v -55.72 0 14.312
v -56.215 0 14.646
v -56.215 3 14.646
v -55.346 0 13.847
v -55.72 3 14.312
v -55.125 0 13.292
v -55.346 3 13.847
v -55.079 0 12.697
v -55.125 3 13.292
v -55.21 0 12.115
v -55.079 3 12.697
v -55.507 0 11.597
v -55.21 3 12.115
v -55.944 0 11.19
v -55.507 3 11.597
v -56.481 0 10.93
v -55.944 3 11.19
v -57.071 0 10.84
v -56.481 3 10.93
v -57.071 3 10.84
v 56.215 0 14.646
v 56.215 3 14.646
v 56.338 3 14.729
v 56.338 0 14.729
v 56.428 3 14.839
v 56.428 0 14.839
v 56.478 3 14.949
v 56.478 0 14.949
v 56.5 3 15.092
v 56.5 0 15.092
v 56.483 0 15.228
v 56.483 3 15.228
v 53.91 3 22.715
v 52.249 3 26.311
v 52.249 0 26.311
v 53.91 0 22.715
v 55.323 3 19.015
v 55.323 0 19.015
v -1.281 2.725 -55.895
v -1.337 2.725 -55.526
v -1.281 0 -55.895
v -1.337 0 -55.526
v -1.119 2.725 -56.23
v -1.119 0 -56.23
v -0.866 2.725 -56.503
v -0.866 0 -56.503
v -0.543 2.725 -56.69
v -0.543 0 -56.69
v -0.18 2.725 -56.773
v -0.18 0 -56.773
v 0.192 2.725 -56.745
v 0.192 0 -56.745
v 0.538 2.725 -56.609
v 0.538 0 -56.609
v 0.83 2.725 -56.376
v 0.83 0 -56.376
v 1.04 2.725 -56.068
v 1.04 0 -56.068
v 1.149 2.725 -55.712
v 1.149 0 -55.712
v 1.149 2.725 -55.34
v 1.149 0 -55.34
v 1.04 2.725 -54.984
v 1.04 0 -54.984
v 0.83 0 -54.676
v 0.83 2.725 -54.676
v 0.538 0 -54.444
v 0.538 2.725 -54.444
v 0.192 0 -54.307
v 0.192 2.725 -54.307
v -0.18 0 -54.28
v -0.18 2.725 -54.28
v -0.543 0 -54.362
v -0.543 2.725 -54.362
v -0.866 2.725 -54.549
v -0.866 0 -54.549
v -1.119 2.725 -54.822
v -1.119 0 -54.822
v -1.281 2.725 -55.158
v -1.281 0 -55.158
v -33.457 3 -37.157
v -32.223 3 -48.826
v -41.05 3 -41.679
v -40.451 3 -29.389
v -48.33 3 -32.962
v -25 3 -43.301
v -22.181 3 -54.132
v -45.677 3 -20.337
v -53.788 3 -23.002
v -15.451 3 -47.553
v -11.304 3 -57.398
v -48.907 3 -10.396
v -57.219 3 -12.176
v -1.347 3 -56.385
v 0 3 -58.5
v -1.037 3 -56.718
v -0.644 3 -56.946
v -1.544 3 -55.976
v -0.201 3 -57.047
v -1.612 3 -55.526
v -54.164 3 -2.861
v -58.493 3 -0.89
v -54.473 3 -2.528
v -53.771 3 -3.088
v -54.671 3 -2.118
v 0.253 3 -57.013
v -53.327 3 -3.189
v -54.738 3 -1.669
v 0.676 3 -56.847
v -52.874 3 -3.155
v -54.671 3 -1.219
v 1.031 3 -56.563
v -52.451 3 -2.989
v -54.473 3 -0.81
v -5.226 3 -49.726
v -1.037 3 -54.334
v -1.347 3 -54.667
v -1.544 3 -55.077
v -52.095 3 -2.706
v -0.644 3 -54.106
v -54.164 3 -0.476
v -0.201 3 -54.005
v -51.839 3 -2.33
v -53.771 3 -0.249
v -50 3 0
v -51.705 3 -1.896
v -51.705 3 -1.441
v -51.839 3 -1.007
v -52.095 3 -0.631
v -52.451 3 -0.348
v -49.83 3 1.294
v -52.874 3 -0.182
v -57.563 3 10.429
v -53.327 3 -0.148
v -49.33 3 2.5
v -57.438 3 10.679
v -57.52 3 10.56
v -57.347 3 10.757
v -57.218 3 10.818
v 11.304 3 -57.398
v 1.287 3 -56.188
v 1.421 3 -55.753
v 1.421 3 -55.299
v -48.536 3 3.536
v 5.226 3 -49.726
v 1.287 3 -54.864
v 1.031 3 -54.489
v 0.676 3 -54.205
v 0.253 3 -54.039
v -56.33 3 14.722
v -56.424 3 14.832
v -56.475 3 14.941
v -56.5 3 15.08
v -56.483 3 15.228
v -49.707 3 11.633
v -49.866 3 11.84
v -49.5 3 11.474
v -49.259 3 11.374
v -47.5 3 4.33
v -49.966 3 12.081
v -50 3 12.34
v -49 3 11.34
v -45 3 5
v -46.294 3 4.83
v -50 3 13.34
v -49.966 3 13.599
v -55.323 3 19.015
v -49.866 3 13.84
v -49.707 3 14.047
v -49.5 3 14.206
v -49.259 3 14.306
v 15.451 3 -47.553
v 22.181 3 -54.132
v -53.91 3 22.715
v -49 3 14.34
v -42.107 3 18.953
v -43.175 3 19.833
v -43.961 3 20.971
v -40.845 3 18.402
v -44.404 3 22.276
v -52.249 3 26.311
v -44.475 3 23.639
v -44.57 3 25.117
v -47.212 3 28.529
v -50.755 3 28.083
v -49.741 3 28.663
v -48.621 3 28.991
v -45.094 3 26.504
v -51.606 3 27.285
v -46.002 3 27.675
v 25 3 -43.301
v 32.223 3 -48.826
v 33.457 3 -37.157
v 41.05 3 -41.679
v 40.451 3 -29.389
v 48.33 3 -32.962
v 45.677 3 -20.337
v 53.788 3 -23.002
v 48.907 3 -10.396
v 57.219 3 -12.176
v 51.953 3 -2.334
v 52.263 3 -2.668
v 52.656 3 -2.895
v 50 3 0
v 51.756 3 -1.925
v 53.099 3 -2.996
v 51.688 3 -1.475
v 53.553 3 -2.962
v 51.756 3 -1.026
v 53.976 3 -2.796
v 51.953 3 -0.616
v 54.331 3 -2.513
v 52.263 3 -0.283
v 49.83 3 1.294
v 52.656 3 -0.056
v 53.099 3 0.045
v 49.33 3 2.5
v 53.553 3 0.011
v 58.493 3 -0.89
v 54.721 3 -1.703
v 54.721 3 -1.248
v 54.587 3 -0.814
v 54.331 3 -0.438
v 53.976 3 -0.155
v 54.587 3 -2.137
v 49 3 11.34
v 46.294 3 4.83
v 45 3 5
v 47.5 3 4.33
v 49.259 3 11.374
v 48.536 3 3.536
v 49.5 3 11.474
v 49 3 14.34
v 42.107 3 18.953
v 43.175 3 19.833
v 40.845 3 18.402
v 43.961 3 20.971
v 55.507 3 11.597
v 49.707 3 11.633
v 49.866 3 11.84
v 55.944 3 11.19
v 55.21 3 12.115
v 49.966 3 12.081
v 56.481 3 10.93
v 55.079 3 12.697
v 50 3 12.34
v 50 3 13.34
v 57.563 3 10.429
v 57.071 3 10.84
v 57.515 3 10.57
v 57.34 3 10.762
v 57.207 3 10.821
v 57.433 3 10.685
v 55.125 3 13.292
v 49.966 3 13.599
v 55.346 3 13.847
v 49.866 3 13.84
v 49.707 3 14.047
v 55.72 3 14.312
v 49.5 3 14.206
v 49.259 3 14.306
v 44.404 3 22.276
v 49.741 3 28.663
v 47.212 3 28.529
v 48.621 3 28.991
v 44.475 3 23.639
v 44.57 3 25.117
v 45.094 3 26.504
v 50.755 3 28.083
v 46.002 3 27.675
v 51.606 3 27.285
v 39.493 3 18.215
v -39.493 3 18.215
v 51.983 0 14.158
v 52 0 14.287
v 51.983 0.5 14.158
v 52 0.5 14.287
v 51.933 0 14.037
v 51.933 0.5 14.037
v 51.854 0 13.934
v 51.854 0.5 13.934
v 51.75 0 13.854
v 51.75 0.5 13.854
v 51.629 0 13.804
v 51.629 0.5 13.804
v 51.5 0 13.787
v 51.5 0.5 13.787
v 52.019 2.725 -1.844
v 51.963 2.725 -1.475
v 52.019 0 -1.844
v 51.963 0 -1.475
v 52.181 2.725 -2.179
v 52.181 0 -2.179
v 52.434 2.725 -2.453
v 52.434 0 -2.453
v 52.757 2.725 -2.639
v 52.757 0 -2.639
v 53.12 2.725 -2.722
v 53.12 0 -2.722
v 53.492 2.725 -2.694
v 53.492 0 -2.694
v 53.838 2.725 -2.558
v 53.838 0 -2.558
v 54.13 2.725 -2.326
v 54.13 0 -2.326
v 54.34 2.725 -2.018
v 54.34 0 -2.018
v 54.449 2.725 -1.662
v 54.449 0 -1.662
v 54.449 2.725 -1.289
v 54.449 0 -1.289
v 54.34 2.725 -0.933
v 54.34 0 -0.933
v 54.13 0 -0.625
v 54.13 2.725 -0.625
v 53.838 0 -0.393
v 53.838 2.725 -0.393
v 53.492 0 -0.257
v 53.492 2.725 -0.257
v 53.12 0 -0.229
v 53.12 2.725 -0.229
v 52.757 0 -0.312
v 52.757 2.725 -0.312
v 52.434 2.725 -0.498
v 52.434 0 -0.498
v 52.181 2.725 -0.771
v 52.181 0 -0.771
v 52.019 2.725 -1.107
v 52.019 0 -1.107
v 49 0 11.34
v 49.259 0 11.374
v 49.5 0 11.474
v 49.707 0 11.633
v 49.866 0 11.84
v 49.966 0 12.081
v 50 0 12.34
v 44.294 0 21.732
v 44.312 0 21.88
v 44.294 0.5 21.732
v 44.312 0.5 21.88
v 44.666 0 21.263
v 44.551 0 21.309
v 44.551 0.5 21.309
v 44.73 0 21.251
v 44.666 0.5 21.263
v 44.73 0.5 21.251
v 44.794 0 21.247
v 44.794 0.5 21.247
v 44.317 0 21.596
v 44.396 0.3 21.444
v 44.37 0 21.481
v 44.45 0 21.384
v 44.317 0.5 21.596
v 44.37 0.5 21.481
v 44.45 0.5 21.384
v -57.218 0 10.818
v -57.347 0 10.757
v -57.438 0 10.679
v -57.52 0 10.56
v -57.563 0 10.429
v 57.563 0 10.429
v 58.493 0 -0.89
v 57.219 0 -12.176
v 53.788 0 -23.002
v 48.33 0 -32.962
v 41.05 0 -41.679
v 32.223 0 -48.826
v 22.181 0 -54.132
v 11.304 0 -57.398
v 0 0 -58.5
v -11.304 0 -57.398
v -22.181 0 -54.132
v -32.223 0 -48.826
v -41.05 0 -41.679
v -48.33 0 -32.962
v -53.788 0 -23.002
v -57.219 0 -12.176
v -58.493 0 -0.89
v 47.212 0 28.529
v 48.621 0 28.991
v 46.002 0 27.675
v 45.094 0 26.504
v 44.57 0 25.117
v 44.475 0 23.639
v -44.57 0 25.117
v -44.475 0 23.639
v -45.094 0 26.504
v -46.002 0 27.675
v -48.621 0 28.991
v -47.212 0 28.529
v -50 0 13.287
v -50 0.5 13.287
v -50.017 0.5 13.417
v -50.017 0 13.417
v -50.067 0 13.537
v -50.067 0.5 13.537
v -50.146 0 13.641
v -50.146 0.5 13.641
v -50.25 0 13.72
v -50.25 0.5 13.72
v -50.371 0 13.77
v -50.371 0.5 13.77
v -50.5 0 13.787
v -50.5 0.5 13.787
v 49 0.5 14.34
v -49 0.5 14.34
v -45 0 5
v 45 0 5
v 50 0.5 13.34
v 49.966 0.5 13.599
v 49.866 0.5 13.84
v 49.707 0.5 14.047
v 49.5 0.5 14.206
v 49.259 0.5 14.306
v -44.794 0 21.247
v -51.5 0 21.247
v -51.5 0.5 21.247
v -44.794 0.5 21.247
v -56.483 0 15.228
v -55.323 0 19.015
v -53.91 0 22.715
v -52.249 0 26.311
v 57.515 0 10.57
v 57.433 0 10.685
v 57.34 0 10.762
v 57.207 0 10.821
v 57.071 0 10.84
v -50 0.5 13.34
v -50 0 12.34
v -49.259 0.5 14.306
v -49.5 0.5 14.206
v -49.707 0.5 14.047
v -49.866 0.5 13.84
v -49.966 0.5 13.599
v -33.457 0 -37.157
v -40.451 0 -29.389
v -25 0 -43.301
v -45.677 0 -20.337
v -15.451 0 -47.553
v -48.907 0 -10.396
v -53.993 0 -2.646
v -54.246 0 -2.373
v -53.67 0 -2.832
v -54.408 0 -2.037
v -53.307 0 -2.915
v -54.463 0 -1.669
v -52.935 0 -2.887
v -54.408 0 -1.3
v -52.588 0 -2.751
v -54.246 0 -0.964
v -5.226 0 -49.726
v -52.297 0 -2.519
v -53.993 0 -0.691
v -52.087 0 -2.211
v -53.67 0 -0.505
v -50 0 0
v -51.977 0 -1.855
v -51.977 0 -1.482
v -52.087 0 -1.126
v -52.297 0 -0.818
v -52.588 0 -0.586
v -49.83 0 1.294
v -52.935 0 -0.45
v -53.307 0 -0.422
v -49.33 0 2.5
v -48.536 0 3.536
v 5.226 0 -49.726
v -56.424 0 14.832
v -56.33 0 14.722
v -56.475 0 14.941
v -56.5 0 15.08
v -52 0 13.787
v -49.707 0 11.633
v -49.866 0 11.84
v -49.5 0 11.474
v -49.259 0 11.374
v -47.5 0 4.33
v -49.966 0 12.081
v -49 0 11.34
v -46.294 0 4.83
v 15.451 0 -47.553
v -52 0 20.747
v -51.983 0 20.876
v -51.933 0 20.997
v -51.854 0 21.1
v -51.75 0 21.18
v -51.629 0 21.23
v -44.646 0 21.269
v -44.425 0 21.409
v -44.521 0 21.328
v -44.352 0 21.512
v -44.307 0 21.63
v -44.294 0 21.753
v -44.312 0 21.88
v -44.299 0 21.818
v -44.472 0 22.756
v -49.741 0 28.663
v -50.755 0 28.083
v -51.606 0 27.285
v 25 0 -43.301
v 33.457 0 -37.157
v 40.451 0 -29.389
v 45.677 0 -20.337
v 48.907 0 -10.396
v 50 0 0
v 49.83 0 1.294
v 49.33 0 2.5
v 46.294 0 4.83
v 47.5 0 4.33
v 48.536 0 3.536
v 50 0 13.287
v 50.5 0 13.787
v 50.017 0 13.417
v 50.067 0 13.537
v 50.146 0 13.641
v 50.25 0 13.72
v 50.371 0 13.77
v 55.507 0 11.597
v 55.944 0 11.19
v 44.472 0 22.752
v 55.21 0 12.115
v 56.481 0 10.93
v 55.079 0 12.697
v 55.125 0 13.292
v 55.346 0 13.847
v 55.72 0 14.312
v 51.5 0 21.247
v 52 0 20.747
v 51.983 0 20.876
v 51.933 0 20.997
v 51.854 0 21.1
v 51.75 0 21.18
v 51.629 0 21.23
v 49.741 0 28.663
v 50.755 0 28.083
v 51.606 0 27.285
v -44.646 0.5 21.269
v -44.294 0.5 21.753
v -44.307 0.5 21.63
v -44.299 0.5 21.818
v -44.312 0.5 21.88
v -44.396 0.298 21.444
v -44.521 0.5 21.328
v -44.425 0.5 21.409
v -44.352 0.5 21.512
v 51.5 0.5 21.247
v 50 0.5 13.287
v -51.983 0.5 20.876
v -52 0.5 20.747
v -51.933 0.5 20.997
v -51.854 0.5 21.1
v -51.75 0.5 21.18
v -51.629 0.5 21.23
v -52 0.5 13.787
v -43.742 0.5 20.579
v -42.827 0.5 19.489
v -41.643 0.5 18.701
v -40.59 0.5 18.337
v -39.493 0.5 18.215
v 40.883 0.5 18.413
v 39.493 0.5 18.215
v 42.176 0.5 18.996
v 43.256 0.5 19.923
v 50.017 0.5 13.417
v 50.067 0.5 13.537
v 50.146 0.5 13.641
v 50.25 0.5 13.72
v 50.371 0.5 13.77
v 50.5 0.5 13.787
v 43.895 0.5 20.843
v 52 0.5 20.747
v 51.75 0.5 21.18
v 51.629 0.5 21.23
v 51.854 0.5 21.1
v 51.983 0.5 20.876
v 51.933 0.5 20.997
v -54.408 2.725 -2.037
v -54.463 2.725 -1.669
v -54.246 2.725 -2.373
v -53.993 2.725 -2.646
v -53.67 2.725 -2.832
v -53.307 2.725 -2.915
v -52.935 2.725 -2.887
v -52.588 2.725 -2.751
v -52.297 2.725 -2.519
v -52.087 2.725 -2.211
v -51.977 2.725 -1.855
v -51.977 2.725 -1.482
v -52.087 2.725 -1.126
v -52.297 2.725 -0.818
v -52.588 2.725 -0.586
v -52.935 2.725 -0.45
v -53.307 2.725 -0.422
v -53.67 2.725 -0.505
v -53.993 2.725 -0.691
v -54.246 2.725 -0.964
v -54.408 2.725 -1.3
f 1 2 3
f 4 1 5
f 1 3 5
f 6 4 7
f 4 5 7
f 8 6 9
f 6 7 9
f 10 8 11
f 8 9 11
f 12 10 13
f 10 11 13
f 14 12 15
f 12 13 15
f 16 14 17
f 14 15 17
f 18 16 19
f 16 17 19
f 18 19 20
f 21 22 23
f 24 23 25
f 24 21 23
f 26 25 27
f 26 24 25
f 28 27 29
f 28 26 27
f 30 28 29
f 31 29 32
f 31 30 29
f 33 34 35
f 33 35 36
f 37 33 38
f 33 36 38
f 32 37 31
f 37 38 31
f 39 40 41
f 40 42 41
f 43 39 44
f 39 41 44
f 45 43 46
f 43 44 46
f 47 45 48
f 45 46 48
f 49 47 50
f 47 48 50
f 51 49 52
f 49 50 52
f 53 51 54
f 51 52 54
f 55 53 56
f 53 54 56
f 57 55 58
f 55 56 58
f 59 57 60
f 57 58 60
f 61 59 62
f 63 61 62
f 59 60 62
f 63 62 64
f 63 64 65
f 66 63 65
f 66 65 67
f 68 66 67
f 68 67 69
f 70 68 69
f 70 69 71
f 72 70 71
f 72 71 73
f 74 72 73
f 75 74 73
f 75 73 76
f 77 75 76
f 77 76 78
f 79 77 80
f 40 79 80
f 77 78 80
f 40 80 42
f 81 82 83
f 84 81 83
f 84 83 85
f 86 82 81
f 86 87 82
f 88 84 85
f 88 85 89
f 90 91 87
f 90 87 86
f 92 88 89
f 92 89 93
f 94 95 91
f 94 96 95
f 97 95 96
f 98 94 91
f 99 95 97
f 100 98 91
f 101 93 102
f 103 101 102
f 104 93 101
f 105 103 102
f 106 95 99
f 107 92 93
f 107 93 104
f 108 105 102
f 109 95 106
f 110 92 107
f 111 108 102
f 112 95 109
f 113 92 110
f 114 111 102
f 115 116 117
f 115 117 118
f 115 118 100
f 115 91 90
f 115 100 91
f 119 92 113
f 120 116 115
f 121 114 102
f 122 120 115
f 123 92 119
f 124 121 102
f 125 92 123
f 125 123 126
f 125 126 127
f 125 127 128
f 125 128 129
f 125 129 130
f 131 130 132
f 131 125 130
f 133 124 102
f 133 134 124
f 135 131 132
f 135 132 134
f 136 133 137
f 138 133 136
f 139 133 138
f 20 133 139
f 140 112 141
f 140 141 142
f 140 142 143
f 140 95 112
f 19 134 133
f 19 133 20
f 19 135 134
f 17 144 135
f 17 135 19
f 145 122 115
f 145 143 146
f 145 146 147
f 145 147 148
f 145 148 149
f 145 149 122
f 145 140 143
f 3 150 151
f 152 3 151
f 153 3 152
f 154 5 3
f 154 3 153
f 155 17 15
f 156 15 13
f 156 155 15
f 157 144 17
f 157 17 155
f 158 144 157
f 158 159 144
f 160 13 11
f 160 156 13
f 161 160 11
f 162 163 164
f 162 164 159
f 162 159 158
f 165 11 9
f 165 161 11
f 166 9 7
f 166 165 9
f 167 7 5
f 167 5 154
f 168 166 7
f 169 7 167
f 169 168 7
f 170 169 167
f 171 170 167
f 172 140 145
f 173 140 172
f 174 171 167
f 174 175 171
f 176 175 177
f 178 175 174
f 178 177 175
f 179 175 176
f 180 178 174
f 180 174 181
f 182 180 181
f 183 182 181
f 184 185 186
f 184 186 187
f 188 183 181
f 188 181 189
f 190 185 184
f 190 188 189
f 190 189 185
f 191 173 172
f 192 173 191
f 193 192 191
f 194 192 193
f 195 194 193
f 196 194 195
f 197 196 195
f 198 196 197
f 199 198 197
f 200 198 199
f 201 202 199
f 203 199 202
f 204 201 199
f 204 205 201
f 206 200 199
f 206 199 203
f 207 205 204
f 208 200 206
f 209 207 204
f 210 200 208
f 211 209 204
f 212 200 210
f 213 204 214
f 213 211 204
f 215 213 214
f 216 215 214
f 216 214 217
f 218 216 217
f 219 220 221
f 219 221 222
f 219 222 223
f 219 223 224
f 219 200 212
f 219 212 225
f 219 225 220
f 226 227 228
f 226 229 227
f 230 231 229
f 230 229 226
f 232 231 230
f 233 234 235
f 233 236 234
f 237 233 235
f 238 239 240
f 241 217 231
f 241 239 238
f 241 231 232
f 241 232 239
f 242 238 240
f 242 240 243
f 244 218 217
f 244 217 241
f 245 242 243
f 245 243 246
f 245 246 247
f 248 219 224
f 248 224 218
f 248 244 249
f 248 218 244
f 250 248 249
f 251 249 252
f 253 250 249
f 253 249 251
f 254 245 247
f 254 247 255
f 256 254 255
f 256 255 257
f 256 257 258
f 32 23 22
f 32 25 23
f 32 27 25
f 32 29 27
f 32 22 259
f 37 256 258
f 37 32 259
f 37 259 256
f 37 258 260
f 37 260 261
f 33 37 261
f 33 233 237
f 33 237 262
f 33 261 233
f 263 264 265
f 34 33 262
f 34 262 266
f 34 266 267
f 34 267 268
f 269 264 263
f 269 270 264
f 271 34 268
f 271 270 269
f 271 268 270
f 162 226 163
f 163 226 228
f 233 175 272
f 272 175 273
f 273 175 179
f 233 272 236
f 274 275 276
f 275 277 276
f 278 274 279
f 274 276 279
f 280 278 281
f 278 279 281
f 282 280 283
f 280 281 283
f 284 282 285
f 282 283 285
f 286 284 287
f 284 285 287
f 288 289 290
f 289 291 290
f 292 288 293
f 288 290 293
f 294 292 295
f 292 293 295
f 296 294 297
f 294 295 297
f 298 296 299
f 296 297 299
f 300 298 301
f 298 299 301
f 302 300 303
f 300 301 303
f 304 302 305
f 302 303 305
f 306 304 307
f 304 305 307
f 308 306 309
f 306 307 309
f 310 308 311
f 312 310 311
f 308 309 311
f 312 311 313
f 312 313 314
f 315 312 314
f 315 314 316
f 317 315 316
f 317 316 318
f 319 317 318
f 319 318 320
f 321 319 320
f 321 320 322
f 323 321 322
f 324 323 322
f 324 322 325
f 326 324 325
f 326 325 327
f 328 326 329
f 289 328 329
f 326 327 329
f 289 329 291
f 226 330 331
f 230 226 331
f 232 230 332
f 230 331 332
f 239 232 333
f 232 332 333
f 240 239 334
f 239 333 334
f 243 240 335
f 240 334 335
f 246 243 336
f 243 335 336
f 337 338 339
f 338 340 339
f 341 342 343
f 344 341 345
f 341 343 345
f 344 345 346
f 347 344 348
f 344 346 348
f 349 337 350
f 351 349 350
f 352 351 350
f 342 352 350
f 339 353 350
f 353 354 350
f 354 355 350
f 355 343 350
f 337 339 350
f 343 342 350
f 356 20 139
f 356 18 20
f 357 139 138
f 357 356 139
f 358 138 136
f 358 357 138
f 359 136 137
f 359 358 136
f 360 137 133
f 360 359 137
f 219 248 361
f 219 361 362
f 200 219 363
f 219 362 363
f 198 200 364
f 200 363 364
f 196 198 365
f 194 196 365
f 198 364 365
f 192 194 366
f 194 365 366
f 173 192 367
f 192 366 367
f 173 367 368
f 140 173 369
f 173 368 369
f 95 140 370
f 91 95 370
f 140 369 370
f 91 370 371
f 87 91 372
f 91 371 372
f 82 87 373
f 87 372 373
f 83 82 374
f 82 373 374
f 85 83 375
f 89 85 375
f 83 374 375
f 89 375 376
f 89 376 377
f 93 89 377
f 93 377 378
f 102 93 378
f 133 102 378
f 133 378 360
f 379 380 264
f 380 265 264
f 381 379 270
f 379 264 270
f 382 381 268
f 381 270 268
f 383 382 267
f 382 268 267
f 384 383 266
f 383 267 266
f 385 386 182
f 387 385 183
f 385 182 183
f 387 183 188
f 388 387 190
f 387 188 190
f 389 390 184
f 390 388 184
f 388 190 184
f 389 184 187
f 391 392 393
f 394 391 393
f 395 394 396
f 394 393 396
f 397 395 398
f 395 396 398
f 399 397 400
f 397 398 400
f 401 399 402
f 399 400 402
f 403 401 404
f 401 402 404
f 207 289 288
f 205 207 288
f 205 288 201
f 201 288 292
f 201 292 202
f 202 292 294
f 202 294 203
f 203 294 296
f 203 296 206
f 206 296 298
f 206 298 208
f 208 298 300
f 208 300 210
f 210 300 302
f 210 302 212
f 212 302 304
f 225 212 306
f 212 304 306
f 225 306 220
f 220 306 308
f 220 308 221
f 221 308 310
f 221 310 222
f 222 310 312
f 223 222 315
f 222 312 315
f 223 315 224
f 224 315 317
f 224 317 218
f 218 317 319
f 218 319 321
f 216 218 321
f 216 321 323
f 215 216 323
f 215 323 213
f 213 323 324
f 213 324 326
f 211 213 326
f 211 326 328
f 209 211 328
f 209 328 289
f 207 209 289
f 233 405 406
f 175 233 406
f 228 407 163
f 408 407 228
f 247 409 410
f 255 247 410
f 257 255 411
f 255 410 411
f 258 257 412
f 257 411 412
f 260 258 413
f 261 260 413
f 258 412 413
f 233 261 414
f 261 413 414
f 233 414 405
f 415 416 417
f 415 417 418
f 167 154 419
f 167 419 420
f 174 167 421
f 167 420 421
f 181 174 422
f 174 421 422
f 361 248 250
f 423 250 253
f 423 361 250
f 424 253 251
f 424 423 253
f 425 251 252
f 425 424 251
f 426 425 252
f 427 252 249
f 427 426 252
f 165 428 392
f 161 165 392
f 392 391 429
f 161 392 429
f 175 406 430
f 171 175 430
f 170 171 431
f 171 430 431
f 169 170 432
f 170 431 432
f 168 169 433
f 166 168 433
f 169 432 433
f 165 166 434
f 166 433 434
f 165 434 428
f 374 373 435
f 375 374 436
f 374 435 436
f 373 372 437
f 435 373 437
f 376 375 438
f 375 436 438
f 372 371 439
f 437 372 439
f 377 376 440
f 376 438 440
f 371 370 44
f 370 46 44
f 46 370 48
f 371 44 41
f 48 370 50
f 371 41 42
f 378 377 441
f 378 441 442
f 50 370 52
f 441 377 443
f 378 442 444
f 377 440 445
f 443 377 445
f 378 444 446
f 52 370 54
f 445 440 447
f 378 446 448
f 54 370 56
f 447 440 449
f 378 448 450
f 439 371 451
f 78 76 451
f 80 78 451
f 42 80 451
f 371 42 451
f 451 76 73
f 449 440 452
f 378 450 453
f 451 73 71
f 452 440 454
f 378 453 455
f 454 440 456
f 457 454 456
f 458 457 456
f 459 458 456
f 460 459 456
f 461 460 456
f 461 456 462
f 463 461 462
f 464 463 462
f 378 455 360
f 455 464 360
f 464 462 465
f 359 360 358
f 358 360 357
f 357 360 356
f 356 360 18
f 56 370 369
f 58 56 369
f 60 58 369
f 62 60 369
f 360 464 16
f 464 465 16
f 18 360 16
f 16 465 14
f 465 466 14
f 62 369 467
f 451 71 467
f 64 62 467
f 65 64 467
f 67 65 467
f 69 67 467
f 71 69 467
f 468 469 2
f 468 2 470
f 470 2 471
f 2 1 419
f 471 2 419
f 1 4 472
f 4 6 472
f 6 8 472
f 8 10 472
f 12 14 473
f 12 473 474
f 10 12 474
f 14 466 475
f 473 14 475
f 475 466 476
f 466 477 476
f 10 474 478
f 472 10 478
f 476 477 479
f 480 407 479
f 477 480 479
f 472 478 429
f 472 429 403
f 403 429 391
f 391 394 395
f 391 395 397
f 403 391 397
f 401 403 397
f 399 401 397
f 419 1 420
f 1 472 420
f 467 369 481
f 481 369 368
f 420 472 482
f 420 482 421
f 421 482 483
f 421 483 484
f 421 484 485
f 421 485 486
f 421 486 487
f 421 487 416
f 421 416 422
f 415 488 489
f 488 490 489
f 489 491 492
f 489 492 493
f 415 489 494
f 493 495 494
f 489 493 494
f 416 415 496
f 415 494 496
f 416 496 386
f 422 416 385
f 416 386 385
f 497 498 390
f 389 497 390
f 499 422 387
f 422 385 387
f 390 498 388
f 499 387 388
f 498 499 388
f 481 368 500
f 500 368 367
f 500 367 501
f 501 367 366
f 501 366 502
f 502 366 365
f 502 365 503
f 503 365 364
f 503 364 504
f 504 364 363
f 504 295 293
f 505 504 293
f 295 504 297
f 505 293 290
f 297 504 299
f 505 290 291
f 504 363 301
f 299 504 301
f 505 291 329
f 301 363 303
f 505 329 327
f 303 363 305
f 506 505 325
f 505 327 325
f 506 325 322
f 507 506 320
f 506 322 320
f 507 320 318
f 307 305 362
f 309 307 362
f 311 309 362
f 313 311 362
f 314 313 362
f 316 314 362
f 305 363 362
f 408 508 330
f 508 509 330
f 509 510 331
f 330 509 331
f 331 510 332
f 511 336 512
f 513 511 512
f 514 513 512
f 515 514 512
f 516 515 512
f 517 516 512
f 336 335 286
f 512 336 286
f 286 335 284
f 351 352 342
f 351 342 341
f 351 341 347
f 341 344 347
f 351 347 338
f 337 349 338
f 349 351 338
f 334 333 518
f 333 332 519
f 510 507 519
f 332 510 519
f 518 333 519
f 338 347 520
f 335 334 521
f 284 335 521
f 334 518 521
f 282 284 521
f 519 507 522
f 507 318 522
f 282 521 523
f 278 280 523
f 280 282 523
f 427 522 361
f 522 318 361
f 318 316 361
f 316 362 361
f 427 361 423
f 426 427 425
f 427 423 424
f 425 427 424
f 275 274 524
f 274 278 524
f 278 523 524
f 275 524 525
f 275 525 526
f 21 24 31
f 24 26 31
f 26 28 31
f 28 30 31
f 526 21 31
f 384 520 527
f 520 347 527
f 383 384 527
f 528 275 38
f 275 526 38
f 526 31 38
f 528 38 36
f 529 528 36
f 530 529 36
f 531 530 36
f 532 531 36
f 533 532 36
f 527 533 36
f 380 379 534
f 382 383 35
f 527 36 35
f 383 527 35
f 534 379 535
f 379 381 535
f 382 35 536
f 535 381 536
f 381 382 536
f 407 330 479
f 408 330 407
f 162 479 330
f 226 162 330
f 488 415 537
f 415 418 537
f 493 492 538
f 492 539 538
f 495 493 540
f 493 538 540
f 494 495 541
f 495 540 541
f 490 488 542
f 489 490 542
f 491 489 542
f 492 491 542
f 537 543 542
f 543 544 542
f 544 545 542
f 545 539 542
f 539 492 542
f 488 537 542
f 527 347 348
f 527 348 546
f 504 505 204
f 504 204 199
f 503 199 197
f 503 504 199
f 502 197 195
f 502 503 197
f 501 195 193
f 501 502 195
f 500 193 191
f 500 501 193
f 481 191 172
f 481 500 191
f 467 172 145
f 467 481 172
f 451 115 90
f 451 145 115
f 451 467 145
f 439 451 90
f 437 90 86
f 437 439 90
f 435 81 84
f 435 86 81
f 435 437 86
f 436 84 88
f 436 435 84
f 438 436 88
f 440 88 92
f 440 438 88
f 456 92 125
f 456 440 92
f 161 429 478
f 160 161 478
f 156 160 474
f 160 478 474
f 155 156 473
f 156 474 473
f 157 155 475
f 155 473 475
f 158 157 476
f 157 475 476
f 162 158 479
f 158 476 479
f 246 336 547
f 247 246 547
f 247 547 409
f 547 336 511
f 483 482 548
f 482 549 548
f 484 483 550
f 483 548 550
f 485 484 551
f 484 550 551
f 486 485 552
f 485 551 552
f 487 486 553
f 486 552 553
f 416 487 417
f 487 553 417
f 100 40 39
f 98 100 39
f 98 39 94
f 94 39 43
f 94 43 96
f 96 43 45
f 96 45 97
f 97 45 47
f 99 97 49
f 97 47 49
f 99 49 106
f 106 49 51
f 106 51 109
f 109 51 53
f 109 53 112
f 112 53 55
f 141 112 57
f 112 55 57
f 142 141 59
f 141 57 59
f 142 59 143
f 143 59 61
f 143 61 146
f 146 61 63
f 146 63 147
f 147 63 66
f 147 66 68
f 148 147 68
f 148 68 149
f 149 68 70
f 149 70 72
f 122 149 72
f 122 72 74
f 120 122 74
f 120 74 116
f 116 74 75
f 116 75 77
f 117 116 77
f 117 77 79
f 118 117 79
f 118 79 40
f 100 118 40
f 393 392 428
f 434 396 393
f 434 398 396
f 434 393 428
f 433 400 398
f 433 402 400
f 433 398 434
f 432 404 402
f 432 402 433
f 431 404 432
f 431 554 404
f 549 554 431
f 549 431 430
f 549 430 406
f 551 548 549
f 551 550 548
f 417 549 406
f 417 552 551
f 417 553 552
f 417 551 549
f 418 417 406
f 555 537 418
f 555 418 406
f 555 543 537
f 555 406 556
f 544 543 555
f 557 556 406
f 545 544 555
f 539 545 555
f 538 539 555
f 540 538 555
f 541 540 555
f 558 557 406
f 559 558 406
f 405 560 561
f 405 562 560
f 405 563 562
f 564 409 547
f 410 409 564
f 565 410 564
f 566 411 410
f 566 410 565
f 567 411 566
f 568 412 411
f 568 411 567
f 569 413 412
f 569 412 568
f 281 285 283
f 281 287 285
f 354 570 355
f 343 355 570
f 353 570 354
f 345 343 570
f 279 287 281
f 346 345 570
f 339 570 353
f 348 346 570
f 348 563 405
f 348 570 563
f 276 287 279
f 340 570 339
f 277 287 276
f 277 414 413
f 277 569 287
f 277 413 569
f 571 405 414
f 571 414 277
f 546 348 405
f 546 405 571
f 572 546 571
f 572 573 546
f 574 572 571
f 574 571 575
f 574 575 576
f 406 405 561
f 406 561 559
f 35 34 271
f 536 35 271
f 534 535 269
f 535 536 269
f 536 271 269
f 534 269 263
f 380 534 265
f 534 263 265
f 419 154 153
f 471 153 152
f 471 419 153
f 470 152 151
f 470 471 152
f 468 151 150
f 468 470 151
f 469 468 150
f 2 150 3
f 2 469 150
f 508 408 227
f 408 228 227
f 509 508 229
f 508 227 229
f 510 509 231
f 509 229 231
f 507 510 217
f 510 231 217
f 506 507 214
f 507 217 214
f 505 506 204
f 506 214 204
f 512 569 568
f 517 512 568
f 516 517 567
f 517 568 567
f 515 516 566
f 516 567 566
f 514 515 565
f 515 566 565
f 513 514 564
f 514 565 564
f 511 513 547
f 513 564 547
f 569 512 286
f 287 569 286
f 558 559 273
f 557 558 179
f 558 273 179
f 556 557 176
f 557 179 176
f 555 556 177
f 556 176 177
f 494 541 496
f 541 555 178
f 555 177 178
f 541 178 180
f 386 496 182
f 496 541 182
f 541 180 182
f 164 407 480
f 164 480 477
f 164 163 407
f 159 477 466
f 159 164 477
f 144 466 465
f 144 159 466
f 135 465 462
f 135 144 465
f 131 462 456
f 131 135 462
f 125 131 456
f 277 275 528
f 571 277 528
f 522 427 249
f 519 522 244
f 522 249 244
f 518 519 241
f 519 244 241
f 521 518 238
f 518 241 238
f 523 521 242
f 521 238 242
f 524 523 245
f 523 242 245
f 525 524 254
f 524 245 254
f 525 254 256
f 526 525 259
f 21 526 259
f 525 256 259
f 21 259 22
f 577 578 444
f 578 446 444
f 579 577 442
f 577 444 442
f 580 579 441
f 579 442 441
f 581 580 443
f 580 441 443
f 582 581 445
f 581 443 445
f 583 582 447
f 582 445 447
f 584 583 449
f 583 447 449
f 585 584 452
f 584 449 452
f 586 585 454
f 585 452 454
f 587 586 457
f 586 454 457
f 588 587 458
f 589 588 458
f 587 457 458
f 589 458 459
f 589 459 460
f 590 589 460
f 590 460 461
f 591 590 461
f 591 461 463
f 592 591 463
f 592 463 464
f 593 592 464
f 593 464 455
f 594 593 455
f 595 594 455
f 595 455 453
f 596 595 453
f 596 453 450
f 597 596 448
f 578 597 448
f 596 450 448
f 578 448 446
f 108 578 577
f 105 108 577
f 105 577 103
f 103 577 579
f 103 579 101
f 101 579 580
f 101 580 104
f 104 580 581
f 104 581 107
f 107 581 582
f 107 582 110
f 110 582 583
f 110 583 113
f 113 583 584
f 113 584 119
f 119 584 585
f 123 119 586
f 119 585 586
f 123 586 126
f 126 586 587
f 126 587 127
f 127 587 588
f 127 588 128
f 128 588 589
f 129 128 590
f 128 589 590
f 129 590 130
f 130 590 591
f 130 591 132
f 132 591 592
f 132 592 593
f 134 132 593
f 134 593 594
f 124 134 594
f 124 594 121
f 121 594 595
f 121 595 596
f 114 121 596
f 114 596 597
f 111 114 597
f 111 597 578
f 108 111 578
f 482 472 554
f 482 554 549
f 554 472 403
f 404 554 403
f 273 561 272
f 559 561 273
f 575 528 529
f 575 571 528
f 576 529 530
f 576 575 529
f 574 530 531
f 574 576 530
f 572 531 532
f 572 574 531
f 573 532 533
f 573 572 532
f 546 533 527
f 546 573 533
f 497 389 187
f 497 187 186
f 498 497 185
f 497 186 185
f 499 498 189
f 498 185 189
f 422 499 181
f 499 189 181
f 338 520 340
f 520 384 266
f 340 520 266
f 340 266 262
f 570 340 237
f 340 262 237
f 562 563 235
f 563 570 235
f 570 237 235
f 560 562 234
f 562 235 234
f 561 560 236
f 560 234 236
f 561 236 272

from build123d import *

# Parameters (mm, degrees)
SKETCH_2_R                   = 58.5
EXTRUDE_1_DEPTH              = 3
CUT_EXTRUDE_2_DEPTH          = 83.785868359
CUT_EXTRUDE_3_DEPTH          = 83.785868359
SKETCH_5_W                   = 107.181767534
SKETCH_5_H                   = 58.876454488
CUT_EXTRUDE_8_DEPTH          = 83.785868359
FILLET_2_R                   = 5
CUT_EXTRUDE_9_DEPTH          = 83.785868359
FILLET_4_R                   = 5
FILLET_7_R                   = 5
SKETCH_8_W                   = 104
SKETCH_8_H                   = 7.45940389
CUT_EXTRUDE_10_DEPTH         = 0.5
FILLET_8_R                   = 0.5
SKETCH_9_R                   = 2
CUT_EXTRUDE_11_DEPTH         = 10
FILLET_9_R                   = 0.5
HOLE_WIZARD_M3_1_D           = 2.5
HOLE_WIZARD_M3_1_DEPTH       = 3.9
HOLE_WIZARD_M3_1_CSINK_D     = 3.05
HOLE_WIZARD_M3_1_CSINK_ANGLE = 90
HOLE_WIZARD_M3_1_TIP         = 0.751075774


with BuildPart() as part:
    # 草图2 → 凸台-拉伸1 (new body)
    with BuildSketch(Plane(origin=(0, 0, 0), x_dir=(1, 0, 0), z_dir=(0, 1, 0))):
        with Locations(Location((0, 0, 0), (0, 0, 270))):
            Circle(SKETCH_2_R)
    extrude(amount=EXTRUDE_1_DEPTH)

    # 草图3 → 切除-拉伸2 (cut, through all)
    with BuildSketch(Plane.XZ):
        with BuildLine():
            Line((-49.749371855, 5), (49.749371855, 5))
            ThreePointArc((49.749371855, 5), (0, -50), (-49.749371855, 5))
        make_face()
    extrude(amount=-CUT_EXTRUDE_2_DEPTH, mode=Mode.SUBTRACT)

    # 草图4 → 切除-拉伸3 (cut, through all)
    with BuildSketch(Plane(origin=(0, 0, 0), x_dir=(-1, 0, 0), z_dir=(0, -1, 0))):
        with BuildLine():
            Line((-46.56392527, -18.215401819), (46.56392527, -18.215401819))
            ThreePointArc((46.56392527, -18.215401819), (0, -50), (-46.56392527, -18.215401819))
        make_face()
    extrude(amount=-CUT_EXTRUDE_3_DEPTH, mode=Mode.SUBTRACT)

    # 草图5 → 切除-拉伸8 (cut, through all)
    with BuildSketch(Plane(origin=(0, 0, 0), x_dir=(1, 0, 0), z_dir=(0, 1, 0))):
        with Locations((0, -58.5)):
            Rectangle(SKETCH_5_W, SKETCH_5_H)
    extrude(amount=CUT_EXTRUDE_8_DEPTH, mode=Mode.SUBTRACT)

    # 圆角2
    # the kernel refuses this fillet: 5 mm, written as the material it takes off along each edge
    with BuildSketch(Plane(origin=(-50.770693951, 10.80866432, 29.061772756), x_dir=(-0.473436338201062, 0, -0.8808280386492982), z_dir=(0, -1, 0))) as fillet_2_piece_1:
        with BuildLine():
            CenterArc((2.989984287, 4.998217953), FILLET_2_R, 208.257588903, 63.272177489)
            Line((-1.414155907, 2.631036262), (0, 0))
            ThreePointArc((0, 0), (1.561732864, -0.020849951), (3.123465728, 0))
        make_face()
    extrude(amount=18.61732864, mode=Mode.SUBTRACT)
    with BuildSketch(Plane(origin=(50.770693951, 10.80866432, 29.061772756), x_dir=(0.47343633820105957, 0, -0.8808280386492995), z_dir=(0, -1, 0))) as fillet_2_piece_2:
        with BuildLine():
            CenterArc((2.989984287, -4.998217953), FILLET_2_R, 88.470233608, 63.272177489)
            Line((-1.414155907, -2.631036262), (0, 0))
            ThreePointArc((0, 0), (1.561732864, 0.020849951), (3.123465728, 0))
        make_face()
    extrude(amount=18.61732864, mode=Mode.SUBTRACT)
    with BuildSketch(Plane(origin=(-40.686771367, 24.926487598, 29.061772756), x_dir=(-1, 0, 0), z_dir=(0, -1, 0))) as fillet_2_piece_3:
        with BuildLine():
            CenterArc((8.770595039, 5), FILLET_2_R, 154.056362734, 115.943637266)
            ThreePointArc((4.27447082, 7.187433887), (2.287760136, 3.504197713), (0, 0))
            Line((0, 0), (8.770595039, 0))
        make_face()
    extrude(amount=46.852975195, mode=Mode.SUBTRACT)
    with BuildSketch(Plane(origin=(40.686771367, 24.926487598, 29.061772756), x_dir=(1, 0, 0), z_dir=(0, -1, 0))) as fillet_2_piece_4:
        with BuildLine():
            CenterArc((8.770595039, -5), FILLET_2_R, 90, 115.943637266)
            ThreePointArc((4.27447082, -7.187433887), (2.287760136, -3.504197713), (0, 0))
            Line((0, 0), (8.770595039, 0))
        make_face()
    extrude(amount=46.852975195, mode=Mode.SUBTRACT)

    # 草图6 → 切除-拉伸9 (cut, through all)
    with BuildSketch(Plane.XZ):
        with BuildLine():
            Line((-50, 13.34), (-50, 12.34))
            ThreePointArc((-50, 12.34), (-49.707106781, 11.632893219), (-49, 11.34))
            Line((-49, 11.34), (49, 11.34))
            ThreePointArc((49, 11.34), (49.707106781, 11.632893219), (50, 12.34))
            Line((50, 12.34), (50, 13.34))
            ThreePointArc((50, 13.34), (49.707106781, 14.047106781), (49, 14.34))
            Line((49, 14.34), (-49, 14.34))
            ThreePointArc((-49, 14.34), (-49.707106781, 14.047106781), (-50, 13.34))
        make_face()
    extrude(amount=-CUT_EXTRUDE_9_DEPTH, mode=Mode.SUBTRACT)

    # 圆角4
    fillet_4_edges = [part.edges().sort_by_distance(p)[0] for p in [
        (49.749371855, 1.5, 5),
        (-49.749371855, 1.5, 5),
    ]]
    fillet(fillet_4_edges, radius=FILLET_4_R)

    # 圆角7
    fillet_7_edges = [part.edges().sort_by_distance(p)[0] for p in [
        (46.56392527, 1.5, 18.215401819),
        (-46.56392527, 1.5, 18.215401819),
    ]]
    fillet(fillet_7_edges, radius=FILLET_7_R)

    # 草图8 → 切除-拉伸10 (cut)
    with BuildSketch(Plane.XZ):
        with Locations((0, 17.517014665)):
            Rectangle(SKETCH_8_W, SKETCH_8_H)
    extrude(amount=-CUT_EXTRUDE_10_DEPTH, mode=Mode.SUBTRACT)

    # 圆角8
    fillet_8_edges = [part.edges().sort_by_distance(p)[0] for p in [
        (44.089363562, 0.251583272, 21.24671661),
    ]]
    fillet(fillet_8_edges, radius=FILLET_8_R)
    fillet_8_2_edges = [part.edges().sort_by_distance(p)[0] for p in [
        (52, 0.25, 21.24671661),
    ]]
    fillet(fillet_8_2_edges, radius=FILLET_8_R)
    fillet_8_3_edges = [part.edges().sort_by_distance(p)[0] for p in [
        (52, 0.25, 13.78731272),
    ]]
    fillet(fillet_8_3_edges, radius=FILLET_8_R)
    fillet_8_4_edges = [part.edges().sort_by_distance(p)[0] for p in [
        (-52, 0.25, 21.24671661),
    ]]
    fillet(fillet_8_4_edges, radius=FILLET_8_R)
    fillet_8_5_edges = [part.edges().sort_by_distance(p)[0] for p in [
        (-44.089363562, 0.255447628, 21.24671661),
    ]]
    fillet(fillet_8_5_edges, radius=FILLET_8_R)
    # the kernel refuses this fillet: 0.5 mm, written as the material it takes off along each edge
    with BuildSketch(Plane(origin=(49.894377622, 0.5, 13.78731272), x_dir=(0.20668352774517387, 0, -0.9784078491911283), z_dir=(0, -1, 0))) as fillet_8_6_piece_1:
        with BuildLine():
            CenterArc((0.614376094, 0.489203925), FILLET_8_R, 168.071931058, 90)
            Line((0.12517217, 0.592545688), (0.076251777, 0.602879865))
            Line((0.076251777, 0.602879865), (-0.048920392, 0.010334176))
            Line((-0.048920392, 0.010334176), (0.012640058, -0.048375913))
            ThreePointArc((0.012640058, -0.048375913), (0.449150506, -0.0380308), (0.500700154, -0.048920392))
            Line((0.500700154, -0.048920392), (0.51103433, 0))
        make_face()
    extrude(amount=2.014055945, mode=Mode.SUBTRACT)
    # the kernel refuses this fillet: 0.5 mm, written as the material it takes off along each edge
    with BuildSketch(Plane(origin=(-49.894377622, 0.5, 13.78731272), x_dir=(-1, 0, 0), z_dir=(0, -1, 0))) as fillet_8_7_piece_1:
        with BuildLine():
            CenterArc((0.605622378, 0.5), FILLET_8_R, 180, 90)
            Line((0.105622378, 0.5), (0.055622378, 0.5))
            ThreePointArc((0.055622378, 0.5), (0.055622378, 0.44731272), (-0.044718881, 0.022365636))
            Line((-0.044718881, 0.022365636), (0, -0.05))
            Line((0, -0.05), (0.605622378, -0.05))
            Line((0.605622378, -0.05), (0.605622378, 0))
        make_face()
    extrude(amount=2.014055945, mode=Mode.SUBTRACT)

    # 草图9 → 切除-拉伸11 (cut)
    with BuildSketch(Plane(origin=(0, 3, 0), x_dir=(1, 0, 0), z_dir=(0, 1, 0))):
        with Locations((57.07349998, -12.84)):
            Circle(SKETCH_9_R)
        with Locations((-57.07349998, -12.84)):
            Circle(SKETCH_9_R)
    extrude(amount=-CUT_EXTRUDE_11_DEPTH, mode=Mode.SUBTRACT)

    # 圆角9
    fillet_9_edges = [part.edges().sort_by_distance(p)[0] for p in [
        (56.601235389, 1.5, 14.783441832),
        (57.479055827, 1.5, 10.881550497),
        (-57.479055827, 1.5, 10.881550497),
        (-56.601235389, 1.5, 14.783441832),
    ]]
    fillet(fillet_9_edges, radius=FILLET_9_R)

    # M3 螺纹孔1
    with Locations(Plane(origin=(0, 3, 0), x_dir=(1, 0, 0), z_dir=(0, 1, 0))):
        with Locations((53.213363577, 1.475326476), (-53.213363577, 1.668639438), (-0.086594156, 55.526064592), (68.846840655, 52.777963262)):
            CounterSinkHole(HOLE_WIZARD_M3_1_D / 2, HOLE_WIZARD_M3_1_CSINK_D / 2, depth=HOLE_WIZARD_M3_1_DEPTH, counter_sink_angle=HOLE_WIZARD_M3_1_CSINK_ANGLE)
            with Locations((0, 0, -(HOLE_WIZARD_M3_1_DEPTH + HOLE_WIZARD_M3_1_TIP / 2))):  # 118° drill point
                Cone(0, HOLE_WIZARD_M3_1_D / 2, HOLE_WIZARD_M3_1_TIP, mode=Mode.SUBTRACT)


solid = part.part
